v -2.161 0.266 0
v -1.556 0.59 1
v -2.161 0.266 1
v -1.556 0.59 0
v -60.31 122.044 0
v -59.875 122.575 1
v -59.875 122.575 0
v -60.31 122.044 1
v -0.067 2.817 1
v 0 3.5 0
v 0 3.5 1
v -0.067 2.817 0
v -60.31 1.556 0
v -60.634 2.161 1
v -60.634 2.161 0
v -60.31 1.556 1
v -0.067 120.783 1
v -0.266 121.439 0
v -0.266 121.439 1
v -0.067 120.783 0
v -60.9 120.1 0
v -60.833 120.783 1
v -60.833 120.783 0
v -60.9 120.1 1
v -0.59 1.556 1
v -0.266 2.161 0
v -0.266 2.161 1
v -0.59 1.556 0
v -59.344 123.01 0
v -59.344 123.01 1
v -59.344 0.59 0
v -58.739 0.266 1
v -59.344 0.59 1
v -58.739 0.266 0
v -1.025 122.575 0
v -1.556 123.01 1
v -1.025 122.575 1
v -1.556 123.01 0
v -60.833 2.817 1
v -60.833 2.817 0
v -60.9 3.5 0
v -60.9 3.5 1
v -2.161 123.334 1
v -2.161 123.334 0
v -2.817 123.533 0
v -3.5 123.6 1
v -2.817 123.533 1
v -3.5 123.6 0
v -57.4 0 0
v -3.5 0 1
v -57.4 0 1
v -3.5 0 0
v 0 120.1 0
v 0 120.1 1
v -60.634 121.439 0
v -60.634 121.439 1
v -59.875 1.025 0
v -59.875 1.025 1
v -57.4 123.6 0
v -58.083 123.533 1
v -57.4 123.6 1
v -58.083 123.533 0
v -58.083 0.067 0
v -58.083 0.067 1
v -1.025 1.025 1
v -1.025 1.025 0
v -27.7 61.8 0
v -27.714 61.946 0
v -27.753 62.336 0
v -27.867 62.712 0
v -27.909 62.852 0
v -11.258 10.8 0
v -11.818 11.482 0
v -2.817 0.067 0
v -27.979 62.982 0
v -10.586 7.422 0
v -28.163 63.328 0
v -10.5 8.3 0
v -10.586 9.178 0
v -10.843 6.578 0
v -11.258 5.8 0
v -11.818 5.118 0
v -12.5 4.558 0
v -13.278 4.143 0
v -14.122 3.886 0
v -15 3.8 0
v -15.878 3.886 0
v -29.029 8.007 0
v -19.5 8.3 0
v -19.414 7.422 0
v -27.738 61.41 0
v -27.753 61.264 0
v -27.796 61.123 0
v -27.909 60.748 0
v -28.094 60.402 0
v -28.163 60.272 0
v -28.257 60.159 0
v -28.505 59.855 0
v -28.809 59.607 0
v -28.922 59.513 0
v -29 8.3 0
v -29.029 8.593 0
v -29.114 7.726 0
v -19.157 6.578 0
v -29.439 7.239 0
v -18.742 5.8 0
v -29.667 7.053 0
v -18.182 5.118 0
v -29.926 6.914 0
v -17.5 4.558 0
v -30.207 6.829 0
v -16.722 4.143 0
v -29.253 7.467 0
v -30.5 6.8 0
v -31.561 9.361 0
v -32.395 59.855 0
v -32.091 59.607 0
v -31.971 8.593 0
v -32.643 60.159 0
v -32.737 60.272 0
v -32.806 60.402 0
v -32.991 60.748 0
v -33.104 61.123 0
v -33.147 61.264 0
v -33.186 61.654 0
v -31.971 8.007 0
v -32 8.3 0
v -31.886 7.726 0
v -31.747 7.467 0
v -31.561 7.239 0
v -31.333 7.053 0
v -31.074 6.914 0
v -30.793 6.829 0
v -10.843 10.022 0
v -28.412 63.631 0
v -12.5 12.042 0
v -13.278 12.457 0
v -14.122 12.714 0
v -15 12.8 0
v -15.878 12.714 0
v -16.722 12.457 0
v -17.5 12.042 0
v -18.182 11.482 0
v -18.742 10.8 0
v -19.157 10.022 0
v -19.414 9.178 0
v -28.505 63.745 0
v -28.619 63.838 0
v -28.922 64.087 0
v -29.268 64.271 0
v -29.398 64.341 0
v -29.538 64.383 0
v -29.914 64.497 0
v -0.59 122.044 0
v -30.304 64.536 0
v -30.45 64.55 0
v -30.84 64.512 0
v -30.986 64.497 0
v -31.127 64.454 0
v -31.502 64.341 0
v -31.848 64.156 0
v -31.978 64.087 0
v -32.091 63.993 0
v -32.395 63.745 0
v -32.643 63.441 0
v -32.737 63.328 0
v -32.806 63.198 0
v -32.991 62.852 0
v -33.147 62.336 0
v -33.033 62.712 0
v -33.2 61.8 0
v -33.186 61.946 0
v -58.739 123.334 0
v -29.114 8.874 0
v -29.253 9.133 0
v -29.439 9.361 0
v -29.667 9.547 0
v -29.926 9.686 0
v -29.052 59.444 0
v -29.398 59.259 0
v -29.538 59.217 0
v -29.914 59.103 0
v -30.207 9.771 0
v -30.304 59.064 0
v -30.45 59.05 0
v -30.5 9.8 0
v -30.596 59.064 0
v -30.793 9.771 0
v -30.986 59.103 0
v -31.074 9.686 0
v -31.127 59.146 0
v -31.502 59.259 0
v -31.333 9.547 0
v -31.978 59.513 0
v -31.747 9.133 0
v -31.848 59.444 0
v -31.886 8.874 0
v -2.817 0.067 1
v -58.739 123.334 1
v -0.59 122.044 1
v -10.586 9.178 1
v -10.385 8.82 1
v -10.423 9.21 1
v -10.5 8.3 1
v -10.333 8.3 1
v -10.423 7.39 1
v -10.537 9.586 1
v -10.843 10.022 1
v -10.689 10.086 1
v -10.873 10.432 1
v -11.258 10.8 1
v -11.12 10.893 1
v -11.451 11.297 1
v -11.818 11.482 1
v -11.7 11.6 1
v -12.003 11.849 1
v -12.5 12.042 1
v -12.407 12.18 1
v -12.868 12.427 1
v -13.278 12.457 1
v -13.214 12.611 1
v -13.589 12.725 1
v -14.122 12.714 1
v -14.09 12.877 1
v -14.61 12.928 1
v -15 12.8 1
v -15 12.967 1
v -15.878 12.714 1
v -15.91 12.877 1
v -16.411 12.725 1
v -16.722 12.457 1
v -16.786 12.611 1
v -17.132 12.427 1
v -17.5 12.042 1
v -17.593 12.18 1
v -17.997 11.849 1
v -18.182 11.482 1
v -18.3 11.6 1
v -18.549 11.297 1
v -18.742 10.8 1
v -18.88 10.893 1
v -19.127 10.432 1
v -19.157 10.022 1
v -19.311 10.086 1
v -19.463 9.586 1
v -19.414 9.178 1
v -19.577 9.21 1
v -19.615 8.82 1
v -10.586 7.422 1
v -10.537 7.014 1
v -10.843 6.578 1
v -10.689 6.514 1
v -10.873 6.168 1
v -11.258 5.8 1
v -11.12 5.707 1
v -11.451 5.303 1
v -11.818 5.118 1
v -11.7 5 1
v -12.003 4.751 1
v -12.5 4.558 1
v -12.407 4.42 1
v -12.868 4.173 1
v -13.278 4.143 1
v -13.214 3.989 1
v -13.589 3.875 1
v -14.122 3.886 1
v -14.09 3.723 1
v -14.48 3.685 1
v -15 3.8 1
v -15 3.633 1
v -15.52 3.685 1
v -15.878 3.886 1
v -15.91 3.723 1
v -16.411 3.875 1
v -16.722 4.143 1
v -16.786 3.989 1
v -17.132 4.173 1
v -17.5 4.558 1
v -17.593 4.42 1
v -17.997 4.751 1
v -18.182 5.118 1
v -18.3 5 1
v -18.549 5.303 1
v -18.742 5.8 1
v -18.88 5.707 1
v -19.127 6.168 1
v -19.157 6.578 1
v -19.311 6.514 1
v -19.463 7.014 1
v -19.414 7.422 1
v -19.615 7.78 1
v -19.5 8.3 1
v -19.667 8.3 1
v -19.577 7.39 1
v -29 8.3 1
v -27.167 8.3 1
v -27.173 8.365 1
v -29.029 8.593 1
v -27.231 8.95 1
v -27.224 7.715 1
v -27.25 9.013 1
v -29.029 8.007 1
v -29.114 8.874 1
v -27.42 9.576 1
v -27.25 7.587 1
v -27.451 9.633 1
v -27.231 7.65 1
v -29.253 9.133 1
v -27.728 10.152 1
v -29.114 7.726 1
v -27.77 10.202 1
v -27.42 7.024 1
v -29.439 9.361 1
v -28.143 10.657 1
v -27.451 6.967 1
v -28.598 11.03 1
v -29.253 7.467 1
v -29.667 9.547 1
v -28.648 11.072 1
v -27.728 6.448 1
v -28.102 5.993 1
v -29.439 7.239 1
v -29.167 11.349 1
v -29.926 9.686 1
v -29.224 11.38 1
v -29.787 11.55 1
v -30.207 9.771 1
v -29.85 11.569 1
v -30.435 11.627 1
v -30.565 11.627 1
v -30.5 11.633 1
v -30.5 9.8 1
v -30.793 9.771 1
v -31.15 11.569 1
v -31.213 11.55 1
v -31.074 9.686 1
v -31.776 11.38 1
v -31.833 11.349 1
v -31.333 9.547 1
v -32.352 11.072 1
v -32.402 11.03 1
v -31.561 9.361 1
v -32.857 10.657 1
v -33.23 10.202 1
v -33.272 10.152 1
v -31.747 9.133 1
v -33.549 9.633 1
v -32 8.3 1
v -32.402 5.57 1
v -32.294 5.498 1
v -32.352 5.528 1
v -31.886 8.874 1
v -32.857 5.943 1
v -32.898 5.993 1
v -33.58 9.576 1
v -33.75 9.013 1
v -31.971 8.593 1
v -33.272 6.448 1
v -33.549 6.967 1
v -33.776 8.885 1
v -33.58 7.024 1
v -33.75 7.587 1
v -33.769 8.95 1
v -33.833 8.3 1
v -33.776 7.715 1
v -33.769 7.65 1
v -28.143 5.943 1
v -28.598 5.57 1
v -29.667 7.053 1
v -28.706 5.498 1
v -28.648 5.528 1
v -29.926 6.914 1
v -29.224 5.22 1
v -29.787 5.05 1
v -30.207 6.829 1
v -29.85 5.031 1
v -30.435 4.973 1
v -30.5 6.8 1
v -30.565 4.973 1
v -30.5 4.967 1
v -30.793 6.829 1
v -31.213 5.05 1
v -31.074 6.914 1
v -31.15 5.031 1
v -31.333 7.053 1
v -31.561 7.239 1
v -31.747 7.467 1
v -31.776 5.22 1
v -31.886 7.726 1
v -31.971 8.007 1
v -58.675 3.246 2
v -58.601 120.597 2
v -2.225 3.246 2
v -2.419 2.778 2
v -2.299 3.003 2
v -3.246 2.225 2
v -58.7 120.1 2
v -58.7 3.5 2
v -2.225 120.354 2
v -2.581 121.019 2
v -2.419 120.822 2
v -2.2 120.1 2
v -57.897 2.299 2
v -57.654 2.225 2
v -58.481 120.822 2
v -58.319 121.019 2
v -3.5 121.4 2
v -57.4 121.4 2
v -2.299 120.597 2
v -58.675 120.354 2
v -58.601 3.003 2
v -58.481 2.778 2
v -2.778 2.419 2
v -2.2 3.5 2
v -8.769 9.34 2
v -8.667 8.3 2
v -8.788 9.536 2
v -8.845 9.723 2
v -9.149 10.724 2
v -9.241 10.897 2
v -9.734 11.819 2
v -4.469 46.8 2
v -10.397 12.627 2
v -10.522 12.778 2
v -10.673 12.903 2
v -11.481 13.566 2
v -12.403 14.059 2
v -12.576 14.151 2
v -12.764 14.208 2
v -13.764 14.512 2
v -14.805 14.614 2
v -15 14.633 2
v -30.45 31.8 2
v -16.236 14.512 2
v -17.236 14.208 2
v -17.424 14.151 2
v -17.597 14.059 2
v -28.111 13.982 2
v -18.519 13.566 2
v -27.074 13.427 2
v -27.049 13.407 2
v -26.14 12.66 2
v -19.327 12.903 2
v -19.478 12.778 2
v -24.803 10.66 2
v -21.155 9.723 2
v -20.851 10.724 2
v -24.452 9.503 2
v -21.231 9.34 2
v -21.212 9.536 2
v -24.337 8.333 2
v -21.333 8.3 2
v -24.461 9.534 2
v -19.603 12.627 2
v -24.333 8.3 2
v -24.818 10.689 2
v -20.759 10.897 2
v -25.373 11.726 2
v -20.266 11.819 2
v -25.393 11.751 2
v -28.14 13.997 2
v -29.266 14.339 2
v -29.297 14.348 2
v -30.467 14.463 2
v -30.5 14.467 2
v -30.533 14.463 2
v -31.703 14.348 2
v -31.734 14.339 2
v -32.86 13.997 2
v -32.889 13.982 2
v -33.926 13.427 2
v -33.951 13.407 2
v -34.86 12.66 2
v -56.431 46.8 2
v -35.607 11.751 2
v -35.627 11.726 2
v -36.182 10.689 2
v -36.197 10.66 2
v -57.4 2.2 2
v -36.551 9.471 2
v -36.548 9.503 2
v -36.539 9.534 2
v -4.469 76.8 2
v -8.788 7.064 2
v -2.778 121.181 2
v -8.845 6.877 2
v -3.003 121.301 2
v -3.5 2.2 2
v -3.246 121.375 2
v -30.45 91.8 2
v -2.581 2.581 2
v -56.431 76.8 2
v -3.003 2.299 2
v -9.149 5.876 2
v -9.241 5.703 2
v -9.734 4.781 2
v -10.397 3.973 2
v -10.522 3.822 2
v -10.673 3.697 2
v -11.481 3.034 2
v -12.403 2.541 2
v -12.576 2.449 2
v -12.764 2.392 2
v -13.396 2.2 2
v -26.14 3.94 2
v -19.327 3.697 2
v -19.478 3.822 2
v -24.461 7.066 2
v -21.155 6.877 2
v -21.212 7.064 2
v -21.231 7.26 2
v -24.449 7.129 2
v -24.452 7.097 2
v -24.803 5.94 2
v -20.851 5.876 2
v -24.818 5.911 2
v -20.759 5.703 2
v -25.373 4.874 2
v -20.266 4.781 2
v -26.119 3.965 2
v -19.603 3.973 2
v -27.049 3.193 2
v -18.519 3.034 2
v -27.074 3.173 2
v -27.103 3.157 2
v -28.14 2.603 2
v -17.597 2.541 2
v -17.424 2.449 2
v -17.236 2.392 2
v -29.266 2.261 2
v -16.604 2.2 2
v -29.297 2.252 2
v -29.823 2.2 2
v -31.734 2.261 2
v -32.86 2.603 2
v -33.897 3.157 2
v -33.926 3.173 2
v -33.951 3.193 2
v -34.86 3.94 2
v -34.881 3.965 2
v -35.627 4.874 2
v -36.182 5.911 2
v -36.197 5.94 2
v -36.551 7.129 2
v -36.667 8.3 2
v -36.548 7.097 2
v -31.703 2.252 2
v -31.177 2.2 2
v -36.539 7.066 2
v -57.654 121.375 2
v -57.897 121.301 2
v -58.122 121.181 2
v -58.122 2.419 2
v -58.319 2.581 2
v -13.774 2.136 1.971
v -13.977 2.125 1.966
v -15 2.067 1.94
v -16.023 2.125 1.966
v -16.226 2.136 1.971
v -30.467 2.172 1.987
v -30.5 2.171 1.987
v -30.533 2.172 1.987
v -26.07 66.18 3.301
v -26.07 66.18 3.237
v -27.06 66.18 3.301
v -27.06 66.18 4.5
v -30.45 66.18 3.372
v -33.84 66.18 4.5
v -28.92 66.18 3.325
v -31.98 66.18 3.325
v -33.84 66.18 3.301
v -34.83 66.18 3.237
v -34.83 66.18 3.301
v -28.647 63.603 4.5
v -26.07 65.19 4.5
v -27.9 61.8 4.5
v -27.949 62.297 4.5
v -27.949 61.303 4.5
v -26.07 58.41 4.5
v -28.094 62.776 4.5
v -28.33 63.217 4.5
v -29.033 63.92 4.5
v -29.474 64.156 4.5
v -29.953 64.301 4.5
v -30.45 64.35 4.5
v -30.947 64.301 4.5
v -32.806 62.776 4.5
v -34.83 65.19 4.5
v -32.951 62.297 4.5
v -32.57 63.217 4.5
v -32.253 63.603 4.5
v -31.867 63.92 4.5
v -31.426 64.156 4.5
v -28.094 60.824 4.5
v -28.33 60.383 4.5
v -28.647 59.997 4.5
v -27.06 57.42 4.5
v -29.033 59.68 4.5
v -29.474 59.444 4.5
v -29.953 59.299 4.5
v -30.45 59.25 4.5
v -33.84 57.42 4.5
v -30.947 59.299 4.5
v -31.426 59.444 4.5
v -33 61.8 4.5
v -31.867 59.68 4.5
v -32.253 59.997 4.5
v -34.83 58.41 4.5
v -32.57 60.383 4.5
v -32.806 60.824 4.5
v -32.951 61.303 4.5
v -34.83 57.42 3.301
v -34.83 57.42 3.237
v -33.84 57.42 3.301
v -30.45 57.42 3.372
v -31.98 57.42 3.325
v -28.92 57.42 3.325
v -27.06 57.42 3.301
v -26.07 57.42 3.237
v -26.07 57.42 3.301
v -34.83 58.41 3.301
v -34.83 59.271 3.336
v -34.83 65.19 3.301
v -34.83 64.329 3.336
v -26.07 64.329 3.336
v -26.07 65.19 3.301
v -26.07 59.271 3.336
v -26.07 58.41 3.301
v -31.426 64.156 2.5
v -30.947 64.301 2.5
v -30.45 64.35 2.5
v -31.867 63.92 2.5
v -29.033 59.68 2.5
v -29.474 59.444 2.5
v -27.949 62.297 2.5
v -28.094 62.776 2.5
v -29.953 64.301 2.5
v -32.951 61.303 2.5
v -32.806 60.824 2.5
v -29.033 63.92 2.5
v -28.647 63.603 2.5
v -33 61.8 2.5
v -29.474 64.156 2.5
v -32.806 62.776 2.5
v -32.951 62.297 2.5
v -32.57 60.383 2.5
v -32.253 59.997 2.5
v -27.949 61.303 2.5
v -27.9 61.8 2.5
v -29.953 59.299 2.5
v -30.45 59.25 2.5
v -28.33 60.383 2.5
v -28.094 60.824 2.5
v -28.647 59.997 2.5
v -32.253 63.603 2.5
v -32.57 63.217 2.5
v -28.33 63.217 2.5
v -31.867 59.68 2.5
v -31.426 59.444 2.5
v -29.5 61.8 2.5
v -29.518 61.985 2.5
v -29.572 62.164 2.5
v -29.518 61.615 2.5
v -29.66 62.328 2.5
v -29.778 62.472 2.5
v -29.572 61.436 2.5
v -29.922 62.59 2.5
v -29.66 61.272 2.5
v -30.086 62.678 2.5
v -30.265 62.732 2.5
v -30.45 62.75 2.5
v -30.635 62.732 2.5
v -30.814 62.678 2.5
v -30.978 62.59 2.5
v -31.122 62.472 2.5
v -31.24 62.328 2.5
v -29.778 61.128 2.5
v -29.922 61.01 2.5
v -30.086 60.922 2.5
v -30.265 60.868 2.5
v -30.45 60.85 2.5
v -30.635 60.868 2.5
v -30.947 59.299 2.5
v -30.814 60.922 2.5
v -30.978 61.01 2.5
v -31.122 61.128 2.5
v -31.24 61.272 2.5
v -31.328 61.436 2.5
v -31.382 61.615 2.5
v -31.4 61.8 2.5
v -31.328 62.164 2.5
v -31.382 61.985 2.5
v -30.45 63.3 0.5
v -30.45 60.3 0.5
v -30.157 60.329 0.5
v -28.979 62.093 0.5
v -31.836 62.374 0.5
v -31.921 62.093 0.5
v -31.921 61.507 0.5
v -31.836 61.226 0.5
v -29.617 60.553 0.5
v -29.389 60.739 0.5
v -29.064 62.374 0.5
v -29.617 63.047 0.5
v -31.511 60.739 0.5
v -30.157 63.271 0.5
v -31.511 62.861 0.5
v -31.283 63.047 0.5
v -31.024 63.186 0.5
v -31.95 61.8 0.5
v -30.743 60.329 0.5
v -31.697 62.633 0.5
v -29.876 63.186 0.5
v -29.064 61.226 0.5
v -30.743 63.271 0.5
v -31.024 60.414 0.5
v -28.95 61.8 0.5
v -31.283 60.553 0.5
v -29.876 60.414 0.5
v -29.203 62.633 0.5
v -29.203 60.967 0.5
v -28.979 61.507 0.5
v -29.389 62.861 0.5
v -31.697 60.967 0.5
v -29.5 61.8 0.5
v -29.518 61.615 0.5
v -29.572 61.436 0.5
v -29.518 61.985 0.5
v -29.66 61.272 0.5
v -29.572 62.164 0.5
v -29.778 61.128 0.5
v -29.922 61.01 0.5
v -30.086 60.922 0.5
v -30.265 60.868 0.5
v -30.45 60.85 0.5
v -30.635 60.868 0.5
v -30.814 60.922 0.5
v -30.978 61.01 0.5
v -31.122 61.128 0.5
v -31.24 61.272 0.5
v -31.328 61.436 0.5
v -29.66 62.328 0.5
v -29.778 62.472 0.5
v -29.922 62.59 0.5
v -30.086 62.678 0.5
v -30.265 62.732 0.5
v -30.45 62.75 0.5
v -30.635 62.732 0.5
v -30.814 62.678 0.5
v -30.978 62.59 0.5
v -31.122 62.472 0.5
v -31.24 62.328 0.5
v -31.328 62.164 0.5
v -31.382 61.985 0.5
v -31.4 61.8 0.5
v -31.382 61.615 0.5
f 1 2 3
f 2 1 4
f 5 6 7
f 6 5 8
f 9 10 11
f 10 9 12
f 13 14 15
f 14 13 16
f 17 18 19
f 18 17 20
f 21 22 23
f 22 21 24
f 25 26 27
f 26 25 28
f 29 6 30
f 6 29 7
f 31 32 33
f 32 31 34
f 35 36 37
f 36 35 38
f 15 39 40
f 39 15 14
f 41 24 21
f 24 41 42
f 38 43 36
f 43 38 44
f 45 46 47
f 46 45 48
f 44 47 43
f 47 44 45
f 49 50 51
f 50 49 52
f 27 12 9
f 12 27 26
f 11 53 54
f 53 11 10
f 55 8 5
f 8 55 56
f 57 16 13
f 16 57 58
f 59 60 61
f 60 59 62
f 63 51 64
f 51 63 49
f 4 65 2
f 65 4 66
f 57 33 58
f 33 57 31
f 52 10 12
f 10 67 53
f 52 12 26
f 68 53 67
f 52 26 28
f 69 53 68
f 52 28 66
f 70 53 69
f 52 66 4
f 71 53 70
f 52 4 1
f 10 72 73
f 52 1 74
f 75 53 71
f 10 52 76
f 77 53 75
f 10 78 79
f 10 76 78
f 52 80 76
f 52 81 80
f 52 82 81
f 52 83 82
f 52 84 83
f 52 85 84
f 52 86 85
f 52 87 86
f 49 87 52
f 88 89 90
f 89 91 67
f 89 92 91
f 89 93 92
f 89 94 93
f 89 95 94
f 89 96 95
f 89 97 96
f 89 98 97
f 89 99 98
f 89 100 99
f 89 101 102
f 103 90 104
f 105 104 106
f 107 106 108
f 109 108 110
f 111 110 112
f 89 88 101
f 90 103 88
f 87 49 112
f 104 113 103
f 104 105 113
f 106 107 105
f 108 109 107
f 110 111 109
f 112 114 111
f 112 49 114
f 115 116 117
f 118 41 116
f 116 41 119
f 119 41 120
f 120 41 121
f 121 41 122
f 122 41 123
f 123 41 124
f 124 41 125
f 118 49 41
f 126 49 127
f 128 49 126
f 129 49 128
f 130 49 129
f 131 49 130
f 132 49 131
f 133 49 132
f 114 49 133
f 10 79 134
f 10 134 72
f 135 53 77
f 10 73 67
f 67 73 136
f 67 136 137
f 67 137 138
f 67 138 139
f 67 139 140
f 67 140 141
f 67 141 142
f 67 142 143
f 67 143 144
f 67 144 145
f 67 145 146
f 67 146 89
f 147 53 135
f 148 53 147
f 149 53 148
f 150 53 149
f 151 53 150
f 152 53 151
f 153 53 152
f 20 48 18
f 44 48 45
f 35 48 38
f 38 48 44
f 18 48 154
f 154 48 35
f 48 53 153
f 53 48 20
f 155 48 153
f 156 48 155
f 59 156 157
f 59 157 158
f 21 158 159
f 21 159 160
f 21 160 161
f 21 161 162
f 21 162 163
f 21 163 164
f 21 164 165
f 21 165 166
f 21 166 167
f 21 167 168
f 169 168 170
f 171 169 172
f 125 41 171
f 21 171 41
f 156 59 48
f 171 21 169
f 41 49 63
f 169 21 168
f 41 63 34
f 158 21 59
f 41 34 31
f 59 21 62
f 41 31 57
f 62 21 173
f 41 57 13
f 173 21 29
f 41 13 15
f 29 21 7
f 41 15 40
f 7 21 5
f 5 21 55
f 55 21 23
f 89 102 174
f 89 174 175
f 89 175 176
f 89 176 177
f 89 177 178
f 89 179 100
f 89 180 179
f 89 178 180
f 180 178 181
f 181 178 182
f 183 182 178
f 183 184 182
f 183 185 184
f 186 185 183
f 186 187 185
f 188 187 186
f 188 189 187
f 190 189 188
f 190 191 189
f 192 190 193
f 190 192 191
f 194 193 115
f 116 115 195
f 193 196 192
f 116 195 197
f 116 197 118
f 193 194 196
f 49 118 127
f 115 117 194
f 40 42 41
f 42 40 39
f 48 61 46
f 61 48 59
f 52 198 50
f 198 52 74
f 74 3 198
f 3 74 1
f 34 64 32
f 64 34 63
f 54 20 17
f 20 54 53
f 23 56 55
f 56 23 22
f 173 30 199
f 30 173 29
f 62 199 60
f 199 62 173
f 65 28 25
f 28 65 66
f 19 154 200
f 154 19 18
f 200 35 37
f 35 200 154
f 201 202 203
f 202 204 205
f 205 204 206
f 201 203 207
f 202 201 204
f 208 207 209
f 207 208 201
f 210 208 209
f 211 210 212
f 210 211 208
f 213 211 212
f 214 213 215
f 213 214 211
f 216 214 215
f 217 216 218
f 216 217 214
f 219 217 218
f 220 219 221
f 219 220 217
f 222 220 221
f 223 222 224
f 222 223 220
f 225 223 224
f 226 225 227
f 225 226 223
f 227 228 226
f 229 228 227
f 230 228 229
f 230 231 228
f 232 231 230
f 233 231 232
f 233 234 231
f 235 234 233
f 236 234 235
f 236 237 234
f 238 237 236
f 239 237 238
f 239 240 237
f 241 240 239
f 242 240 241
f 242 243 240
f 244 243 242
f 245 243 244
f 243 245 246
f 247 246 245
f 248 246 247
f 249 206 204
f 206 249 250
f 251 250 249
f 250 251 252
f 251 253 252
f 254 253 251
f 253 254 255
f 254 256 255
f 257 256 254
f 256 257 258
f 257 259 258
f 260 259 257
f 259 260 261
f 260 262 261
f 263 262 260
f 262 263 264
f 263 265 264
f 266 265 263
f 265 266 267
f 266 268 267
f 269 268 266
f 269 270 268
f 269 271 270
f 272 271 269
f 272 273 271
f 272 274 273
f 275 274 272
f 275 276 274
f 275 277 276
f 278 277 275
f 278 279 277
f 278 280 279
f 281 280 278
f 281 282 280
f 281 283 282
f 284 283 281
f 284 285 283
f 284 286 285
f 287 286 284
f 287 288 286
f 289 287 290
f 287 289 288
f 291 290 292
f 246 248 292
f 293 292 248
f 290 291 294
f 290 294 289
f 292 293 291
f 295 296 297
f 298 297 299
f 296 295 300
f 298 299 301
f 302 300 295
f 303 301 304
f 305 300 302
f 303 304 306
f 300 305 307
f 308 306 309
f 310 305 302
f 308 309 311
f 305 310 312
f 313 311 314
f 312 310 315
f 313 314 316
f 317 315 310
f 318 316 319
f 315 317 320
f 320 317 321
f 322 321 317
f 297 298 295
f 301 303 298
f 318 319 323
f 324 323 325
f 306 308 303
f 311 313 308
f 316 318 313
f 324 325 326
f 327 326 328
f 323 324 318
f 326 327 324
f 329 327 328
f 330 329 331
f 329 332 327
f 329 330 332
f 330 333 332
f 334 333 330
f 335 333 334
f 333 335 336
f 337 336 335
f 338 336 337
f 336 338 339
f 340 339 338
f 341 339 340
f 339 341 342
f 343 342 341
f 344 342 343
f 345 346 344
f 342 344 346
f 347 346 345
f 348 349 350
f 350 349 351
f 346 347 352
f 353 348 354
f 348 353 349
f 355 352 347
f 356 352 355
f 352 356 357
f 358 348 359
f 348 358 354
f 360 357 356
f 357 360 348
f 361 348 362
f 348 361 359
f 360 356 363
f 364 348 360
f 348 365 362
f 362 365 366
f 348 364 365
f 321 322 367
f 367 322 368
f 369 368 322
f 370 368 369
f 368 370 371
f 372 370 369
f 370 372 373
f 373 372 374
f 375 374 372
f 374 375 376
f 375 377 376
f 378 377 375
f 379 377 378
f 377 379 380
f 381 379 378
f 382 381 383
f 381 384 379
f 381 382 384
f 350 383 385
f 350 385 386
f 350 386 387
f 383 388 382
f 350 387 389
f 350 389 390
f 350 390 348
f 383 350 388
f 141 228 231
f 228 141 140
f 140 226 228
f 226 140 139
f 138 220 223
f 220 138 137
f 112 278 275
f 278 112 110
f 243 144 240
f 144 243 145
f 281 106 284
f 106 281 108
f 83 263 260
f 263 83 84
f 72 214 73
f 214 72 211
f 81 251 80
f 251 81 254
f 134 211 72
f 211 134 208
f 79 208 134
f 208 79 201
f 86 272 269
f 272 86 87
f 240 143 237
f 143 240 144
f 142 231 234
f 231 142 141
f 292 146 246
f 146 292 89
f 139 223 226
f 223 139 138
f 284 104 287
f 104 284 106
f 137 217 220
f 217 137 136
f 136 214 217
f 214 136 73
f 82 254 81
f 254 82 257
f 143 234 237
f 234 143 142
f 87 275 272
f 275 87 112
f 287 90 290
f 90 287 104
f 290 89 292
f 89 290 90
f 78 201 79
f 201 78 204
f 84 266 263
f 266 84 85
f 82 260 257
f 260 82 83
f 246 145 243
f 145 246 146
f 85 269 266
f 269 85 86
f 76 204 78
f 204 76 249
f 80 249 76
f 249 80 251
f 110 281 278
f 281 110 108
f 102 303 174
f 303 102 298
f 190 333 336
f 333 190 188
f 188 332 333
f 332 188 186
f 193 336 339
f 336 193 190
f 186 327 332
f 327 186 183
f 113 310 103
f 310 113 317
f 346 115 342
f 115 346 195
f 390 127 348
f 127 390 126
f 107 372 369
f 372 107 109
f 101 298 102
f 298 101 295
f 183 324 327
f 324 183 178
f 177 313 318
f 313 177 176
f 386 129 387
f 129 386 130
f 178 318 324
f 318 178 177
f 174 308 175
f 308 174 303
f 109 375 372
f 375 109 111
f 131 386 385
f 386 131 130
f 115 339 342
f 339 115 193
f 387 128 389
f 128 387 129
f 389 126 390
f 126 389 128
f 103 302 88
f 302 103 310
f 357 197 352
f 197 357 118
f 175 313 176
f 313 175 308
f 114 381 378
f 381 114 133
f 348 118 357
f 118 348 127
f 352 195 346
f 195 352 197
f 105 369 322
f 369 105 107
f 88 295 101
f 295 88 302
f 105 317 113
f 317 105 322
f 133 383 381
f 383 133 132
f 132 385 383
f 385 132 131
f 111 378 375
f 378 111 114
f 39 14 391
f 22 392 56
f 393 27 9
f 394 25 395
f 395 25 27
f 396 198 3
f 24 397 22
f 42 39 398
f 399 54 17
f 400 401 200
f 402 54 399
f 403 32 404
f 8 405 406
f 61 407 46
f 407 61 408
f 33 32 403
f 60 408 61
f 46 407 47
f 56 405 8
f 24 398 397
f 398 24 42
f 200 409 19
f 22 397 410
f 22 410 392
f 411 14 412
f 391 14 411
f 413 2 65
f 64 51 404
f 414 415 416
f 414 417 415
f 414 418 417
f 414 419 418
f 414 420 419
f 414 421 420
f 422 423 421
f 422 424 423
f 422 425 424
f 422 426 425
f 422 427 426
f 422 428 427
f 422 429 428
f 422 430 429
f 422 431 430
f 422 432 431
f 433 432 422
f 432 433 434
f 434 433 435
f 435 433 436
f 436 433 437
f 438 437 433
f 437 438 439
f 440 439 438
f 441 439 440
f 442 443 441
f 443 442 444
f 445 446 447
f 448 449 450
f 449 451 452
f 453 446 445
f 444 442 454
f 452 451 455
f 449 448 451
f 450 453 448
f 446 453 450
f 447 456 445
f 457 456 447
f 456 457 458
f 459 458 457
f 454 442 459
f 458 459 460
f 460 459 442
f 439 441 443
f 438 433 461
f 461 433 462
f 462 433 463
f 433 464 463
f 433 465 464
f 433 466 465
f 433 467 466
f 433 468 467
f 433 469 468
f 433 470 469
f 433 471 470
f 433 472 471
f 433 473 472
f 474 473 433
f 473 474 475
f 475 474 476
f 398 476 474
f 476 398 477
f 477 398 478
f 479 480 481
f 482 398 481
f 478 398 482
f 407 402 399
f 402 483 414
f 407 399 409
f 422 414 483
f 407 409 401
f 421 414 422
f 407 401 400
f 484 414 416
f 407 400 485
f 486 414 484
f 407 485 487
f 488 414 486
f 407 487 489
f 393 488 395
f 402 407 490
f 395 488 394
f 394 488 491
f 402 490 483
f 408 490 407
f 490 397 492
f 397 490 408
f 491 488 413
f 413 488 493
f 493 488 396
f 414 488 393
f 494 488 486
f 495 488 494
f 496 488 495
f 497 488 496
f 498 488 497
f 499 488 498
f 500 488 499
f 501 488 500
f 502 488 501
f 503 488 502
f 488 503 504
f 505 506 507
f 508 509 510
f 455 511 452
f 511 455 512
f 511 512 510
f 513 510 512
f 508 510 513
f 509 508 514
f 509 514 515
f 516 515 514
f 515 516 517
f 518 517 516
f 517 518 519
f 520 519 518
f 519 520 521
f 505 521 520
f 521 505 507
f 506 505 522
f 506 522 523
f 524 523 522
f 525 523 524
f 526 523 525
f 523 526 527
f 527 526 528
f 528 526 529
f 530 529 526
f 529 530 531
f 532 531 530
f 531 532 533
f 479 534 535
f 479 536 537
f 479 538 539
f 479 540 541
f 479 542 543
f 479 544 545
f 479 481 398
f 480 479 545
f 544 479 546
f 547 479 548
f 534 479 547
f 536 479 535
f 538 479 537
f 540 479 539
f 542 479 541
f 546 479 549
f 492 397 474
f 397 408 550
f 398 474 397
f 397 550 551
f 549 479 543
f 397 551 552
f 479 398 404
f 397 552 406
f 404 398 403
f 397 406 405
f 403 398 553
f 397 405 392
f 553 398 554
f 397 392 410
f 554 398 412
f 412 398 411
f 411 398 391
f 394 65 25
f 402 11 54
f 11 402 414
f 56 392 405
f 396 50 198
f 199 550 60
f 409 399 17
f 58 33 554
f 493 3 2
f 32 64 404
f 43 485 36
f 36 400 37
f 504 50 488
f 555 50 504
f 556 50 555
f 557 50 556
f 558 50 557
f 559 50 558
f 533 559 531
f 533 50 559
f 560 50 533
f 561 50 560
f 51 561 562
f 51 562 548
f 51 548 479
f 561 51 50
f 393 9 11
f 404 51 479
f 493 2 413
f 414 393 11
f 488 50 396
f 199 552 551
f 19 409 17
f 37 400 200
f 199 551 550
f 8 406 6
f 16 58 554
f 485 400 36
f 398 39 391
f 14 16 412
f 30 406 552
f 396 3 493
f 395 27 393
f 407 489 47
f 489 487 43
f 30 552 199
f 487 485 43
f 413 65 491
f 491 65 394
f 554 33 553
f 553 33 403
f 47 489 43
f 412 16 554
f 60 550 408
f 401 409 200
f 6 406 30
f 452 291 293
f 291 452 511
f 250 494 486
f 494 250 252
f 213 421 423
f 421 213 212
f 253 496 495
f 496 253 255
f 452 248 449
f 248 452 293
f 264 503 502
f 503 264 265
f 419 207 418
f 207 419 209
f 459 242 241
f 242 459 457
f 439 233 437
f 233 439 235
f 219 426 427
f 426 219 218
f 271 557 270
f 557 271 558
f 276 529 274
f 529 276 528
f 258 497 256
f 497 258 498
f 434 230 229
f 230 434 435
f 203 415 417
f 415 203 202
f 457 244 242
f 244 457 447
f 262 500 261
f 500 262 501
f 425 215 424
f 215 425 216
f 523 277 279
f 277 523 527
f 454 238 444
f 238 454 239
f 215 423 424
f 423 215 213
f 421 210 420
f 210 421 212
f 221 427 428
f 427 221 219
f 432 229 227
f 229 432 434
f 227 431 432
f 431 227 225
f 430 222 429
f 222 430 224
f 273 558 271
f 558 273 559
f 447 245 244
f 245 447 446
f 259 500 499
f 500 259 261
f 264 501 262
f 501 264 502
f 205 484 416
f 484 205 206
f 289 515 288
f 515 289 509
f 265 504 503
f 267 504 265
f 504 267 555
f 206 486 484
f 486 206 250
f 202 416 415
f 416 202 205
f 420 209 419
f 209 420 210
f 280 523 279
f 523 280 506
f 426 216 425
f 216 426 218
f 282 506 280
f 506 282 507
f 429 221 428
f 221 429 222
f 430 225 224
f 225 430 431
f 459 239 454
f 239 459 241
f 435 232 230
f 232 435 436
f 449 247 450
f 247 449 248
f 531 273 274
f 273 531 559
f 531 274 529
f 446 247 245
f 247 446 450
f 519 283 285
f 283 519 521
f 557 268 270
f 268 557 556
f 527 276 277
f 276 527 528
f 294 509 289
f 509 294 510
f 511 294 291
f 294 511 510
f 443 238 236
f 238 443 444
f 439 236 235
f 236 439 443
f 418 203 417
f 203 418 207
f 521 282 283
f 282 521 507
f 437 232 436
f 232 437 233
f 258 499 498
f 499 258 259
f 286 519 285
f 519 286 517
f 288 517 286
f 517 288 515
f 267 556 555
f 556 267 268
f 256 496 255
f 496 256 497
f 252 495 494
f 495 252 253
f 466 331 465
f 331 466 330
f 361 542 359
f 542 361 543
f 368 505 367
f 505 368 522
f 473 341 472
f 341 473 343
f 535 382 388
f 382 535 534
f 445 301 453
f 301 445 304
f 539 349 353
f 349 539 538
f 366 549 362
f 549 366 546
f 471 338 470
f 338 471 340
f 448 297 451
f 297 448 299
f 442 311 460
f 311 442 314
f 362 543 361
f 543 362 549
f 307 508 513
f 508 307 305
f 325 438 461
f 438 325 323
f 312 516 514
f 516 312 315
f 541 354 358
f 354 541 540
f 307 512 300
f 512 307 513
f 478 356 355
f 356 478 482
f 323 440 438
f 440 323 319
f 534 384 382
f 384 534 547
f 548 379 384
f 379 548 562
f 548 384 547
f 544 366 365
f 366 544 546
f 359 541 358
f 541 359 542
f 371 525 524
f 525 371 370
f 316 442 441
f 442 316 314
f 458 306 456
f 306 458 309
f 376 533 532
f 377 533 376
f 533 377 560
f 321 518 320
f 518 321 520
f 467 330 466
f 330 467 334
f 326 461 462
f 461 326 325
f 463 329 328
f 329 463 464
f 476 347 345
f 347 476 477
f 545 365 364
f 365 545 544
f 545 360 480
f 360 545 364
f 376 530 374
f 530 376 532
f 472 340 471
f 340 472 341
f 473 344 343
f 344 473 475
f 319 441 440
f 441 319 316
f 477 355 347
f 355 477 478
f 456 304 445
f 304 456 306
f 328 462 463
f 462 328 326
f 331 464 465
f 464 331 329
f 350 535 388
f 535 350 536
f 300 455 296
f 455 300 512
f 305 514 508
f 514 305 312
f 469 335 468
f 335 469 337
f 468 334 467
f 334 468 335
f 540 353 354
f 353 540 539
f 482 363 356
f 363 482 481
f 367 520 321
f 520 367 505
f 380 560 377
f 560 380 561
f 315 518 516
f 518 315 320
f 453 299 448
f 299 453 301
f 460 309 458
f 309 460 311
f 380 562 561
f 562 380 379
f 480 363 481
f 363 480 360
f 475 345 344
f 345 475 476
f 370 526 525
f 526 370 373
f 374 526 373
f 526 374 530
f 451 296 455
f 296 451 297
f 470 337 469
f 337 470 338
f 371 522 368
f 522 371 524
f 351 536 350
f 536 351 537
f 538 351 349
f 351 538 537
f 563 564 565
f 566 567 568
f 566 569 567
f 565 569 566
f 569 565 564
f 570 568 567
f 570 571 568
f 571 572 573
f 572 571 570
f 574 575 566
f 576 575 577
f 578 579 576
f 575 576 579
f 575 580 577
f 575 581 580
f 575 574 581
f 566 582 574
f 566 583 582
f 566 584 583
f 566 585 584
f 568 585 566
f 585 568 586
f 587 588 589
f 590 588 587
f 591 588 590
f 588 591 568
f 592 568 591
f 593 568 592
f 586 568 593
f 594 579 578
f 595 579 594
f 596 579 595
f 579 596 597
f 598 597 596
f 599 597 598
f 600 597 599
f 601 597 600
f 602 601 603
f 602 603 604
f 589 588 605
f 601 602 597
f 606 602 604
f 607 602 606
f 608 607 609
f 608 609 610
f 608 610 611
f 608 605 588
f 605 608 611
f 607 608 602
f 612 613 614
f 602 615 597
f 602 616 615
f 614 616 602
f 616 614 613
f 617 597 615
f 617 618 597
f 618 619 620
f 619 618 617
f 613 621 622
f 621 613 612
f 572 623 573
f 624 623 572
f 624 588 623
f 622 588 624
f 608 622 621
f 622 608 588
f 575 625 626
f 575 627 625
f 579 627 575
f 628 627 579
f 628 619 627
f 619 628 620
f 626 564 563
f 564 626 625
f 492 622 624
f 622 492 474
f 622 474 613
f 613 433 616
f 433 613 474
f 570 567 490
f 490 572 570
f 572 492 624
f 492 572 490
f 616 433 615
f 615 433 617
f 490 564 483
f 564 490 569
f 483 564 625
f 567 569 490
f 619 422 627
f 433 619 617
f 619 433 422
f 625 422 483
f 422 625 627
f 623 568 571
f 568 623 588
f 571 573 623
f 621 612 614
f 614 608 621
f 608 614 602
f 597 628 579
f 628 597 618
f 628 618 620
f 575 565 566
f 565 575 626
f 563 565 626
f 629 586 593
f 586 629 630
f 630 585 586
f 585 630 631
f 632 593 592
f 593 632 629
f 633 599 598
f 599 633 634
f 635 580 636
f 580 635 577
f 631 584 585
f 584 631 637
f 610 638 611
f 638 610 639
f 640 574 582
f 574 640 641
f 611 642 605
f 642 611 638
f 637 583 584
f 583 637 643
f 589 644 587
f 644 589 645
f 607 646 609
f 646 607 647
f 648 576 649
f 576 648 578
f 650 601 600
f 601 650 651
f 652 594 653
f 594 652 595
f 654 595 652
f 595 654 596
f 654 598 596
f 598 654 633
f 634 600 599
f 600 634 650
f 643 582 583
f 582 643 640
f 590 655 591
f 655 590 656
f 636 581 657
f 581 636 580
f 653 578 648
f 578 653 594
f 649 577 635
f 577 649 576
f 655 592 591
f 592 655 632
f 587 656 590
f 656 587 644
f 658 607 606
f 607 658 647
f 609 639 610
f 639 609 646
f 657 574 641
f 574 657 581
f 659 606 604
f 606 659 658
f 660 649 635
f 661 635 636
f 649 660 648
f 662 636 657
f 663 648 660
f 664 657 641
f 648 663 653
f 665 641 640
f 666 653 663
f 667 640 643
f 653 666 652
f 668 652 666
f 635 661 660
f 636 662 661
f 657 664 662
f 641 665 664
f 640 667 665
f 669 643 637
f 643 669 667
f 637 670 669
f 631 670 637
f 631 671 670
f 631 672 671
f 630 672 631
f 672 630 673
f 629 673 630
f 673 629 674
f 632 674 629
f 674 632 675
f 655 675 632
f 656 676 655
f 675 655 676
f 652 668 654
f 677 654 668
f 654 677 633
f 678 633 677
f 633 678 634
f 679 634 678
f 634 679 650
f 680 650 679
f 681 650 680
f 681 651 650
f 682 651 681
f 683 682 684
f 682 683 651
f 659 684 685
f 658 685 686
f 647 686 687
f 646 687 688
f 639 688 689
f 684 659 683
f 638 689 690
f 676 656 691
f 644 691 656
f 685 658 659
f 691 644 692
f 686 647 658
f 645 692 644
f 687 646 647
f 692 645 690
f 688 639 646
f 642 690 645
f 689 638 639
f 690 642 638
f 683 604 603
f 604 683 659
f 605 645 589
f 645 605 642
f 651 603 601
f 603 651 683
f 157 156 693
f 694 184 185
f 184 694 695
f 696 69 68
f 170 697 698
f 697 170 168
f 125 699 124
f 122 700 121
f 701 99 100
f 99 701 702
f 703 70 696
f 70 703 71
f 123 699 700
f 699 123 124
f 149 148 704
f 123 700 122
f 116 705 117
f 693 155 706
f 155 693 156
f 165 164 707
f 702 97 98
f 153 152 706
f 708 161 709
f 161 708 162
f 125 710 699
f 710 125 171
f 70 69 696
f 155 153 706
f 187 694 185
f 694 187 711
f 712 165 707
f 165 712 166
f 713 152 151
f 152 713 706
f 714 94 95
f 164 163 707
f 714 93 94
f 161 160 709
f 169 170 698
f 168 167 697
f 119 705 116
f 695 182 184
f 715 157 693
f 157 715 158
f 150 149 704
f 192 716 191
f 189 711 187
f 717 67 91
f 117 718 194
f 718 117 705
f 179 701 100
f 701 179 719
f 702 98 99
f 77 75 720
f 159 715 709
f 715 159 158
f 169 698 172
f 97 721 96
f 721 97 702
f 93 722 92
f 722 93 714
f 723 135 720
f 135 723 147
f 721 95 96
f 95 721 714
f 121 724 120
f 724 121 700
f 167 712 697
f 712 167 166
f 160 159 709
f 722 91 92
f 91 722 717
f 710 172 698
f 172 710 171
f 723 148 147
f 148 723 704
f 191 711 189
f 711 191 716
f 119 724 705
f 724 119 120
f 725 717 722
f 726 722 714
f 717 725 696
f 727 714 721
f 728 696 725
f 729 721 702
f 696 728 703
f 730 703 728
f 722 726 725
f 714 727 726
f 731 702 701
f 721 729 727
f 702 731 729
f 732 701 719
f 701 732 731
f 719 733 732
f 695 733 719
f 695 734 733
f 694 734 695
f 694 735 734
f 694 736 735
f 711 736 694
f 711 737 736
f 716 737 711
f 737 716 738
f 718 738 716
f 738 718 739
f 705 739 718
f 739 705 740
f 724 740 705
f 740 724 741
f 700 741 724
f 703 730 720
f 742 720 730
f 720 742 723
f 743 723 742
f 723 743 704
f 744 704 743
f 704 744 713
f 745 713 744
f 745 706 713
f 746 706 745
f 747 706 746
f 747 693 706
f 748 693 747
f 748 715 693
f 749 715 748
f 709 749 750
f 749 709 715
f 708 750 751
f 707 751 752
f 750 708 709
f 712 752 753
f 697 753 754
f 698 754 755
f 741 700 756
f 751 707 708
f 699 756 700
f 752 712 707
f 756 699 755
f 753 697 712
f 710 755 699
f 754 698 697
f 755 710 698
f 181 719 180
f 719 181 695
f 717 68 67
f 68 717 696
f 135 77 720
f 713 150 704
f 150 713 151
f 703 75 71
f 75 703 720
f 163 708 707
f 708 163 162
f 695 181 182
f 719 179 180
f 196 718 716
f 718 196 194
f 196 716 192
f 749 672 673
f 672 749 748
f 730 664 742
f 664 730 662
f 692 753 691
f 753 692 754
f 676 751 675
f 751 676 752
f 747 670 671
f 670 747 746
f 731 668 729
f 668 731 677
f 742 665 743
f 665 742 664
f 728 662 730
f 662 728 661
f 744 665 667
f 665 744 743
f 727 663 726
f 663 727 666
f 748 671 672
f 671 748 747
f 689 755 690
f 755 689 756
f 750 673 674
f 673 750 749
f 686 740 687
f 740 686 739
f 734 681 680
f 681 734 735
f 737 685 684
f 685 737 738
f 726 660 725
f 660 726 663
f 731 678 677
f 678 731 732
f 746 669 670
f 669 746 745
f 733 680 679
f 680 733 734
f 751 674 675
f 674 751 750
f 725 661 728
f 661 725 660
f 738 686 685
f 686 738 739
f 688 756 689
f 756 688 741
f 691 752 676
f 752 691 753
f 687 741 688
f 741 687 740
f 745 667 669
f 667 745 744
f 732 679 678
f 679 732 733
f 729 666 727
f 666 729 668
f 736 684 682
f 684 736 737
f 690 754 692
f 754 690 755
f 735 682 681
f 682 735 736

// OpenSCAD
// https://en.wikibooks.org/wiki/OpenSCAD_User_Manual/Tips_and_Tricks#Add_all_values_in_a_list
function add2(v) = [for(p=v) 1] * v;
function mean(v) = add2(v) / len(v);

nutHoleRadius = 6.6/2;
tolerance=0.3;

cornerRadius = 3.5;
length=mean([120.4-tolerance]);
width=mean([57.7-tolerance]);


module nutHole(r1=nutHoleRadius, r2=nutHoleRadius) {
  translate([0,0,-3])
  cylinder(r1=r1, r2=r2, h=6, $fn=6);
}

module backPlateL1() {
  $fn=32;
  depth=1;
  
  /**
  
    A --- B
    |     |
    D --- C
  
  **/
  
  difference() {
    linear_extrude(height=depth)
    hull() {
      // D
      translate([cornerRadius,cornerRadius])
      circle(cornerRadius);
      
      // C
      translate([length,cornerRadius])
      circle(cornerRadius);

      // B
      translate([length,width])
      circle(cornerRadius);
      
      // A
      translate([cornerRadius,width])
      circle(cornerRadius);    
    }
    

    // camera hole
    translate([8.3,15,-1])
    cylinder(r=4.5, h=depth+2);
    
    // flash led hole
    translate([8.3,30.5,-1])
    cylinder(r=1.5,h=depth+2);
  }
}


module backPlateL2() {
  $fn=32;
  depth=1;
  
  /**
  
    A --- B
    |     |
    D --- C
  
  **/
  r2diff = 2.2;
  
  difference() {
    hull() {
      // D
      translate([cornerRadius,cornerRadius])
      cylinder(r1=cornerRadius,r2=cornerRadius-r2diff, height=depth);
      
      // C
      translate([length,cornerRadius])
      cylinder(r1=cornerRadius,r2=cornerRadius-r2diff, height=depth);

      // B
      translate([length,width])
      cylinder(r1=cornerRadius,r2=cornerRadius-r2diff, height=depth);
      
      // A
      translate([cornerRadius,width])
      cylinder(r1=cornerRadius,r2=cornerRadius-r2diff, height=depth);
    }
    

    // camera hole
    translate([8.3,15,-1])
    cylinder(r1=3,r2=8,h=depth+2);
    
    // flash led hole
    translate([8.3,30.5,-1])
    cylinder(r1=0.5, r2=9,h=depth+2);
  }
}

module main() {
  cubeRadius = 1.2;
  cubeSize = 9-tolerance+0.06;
  cornerCutSize = 1.4;
  
  rotate([0,0,90])  {
    difference(){
      union(){
        backPlateL1();
        translate([0,0,1])
          backPlateL2();

        // square insert
        translate([0,0,3])
        translate([length+cornerRadius,width+cornerRadius,0]*0.5)
        translate([-0.5,-0.5,0]*cubeSize)
        cube([cubeSize,cubeSize,1.5]);

        translate([0,0,2])
        translate([length+cornerRadius,width+cornerRadius,0]*0.5)        
        cylinder(r2=2,r1=30,$fn=6,h=1.5);
      }
      
      // cutting corners
      translate([cubeSize/2,cubeSize/2,3.301])
      translate([length+cornerRadius,width+cornerRadius,0]*0.5)
      rotate([0,0,45])
      translate([-0.5,-0.5,0]*cornerCutSize)
      cube([1,1,1]*cornerCutSize);
      translate([-cubeSize/2,cubeSize/2,3.301])
      translate([length+cornerRadius,width+cornerRadius,0]*0.5)
      rotate([0,0,45])
      translate([-0.5,-0.5,0]*cornerCutSize)
      cube([1,1,1]*cornerCutSize);
      translate([-cubeSize/2,-cubeSize/2,3.301])
      translate([length+cornerRadius,width+cornerRadius,0]*0.5)
      rotate([0,0,45])
      translate([-0.5,-0.5,0]*cornerCutSize)
      cube([1,1,1]*cornerCutSize);
      translate([cubeSize/2,-cubeSize/2,3.301])
      translate([length+cornerRadius,width+cornerRadius,0]*0.5)
      rotate([0,0,45])
      translate([-0.5,-0.5,0]*cornerCutSize)
      cube([1,1,1]*cornerCutSize);
      
      
      
      // pilot screw hole for square insert
      translate([0,0,2])
      translate([length+cornerRadius,width+cornerRadius,1]*0.5)      
      cylinder(r=4.5/2+tolerance,h=2.6,$fn=32);      
      
      // pilot screw hole for square insert
      translate([0,0,-1])
      translate([length+cornerRadius,width+cornerRadius,1]*0.5)      
      cylinder(r1=4,r2=1.5,h=1,$fn=32);      


      //* screw hole for square insert
      translate([length+cornerRadius,width+cornerRadius,-1]*0.5)      
      cylinder($fn=32,r=(1.6+tolerance)/2,h=4);
      //*/
    }  
  }
}

main();
